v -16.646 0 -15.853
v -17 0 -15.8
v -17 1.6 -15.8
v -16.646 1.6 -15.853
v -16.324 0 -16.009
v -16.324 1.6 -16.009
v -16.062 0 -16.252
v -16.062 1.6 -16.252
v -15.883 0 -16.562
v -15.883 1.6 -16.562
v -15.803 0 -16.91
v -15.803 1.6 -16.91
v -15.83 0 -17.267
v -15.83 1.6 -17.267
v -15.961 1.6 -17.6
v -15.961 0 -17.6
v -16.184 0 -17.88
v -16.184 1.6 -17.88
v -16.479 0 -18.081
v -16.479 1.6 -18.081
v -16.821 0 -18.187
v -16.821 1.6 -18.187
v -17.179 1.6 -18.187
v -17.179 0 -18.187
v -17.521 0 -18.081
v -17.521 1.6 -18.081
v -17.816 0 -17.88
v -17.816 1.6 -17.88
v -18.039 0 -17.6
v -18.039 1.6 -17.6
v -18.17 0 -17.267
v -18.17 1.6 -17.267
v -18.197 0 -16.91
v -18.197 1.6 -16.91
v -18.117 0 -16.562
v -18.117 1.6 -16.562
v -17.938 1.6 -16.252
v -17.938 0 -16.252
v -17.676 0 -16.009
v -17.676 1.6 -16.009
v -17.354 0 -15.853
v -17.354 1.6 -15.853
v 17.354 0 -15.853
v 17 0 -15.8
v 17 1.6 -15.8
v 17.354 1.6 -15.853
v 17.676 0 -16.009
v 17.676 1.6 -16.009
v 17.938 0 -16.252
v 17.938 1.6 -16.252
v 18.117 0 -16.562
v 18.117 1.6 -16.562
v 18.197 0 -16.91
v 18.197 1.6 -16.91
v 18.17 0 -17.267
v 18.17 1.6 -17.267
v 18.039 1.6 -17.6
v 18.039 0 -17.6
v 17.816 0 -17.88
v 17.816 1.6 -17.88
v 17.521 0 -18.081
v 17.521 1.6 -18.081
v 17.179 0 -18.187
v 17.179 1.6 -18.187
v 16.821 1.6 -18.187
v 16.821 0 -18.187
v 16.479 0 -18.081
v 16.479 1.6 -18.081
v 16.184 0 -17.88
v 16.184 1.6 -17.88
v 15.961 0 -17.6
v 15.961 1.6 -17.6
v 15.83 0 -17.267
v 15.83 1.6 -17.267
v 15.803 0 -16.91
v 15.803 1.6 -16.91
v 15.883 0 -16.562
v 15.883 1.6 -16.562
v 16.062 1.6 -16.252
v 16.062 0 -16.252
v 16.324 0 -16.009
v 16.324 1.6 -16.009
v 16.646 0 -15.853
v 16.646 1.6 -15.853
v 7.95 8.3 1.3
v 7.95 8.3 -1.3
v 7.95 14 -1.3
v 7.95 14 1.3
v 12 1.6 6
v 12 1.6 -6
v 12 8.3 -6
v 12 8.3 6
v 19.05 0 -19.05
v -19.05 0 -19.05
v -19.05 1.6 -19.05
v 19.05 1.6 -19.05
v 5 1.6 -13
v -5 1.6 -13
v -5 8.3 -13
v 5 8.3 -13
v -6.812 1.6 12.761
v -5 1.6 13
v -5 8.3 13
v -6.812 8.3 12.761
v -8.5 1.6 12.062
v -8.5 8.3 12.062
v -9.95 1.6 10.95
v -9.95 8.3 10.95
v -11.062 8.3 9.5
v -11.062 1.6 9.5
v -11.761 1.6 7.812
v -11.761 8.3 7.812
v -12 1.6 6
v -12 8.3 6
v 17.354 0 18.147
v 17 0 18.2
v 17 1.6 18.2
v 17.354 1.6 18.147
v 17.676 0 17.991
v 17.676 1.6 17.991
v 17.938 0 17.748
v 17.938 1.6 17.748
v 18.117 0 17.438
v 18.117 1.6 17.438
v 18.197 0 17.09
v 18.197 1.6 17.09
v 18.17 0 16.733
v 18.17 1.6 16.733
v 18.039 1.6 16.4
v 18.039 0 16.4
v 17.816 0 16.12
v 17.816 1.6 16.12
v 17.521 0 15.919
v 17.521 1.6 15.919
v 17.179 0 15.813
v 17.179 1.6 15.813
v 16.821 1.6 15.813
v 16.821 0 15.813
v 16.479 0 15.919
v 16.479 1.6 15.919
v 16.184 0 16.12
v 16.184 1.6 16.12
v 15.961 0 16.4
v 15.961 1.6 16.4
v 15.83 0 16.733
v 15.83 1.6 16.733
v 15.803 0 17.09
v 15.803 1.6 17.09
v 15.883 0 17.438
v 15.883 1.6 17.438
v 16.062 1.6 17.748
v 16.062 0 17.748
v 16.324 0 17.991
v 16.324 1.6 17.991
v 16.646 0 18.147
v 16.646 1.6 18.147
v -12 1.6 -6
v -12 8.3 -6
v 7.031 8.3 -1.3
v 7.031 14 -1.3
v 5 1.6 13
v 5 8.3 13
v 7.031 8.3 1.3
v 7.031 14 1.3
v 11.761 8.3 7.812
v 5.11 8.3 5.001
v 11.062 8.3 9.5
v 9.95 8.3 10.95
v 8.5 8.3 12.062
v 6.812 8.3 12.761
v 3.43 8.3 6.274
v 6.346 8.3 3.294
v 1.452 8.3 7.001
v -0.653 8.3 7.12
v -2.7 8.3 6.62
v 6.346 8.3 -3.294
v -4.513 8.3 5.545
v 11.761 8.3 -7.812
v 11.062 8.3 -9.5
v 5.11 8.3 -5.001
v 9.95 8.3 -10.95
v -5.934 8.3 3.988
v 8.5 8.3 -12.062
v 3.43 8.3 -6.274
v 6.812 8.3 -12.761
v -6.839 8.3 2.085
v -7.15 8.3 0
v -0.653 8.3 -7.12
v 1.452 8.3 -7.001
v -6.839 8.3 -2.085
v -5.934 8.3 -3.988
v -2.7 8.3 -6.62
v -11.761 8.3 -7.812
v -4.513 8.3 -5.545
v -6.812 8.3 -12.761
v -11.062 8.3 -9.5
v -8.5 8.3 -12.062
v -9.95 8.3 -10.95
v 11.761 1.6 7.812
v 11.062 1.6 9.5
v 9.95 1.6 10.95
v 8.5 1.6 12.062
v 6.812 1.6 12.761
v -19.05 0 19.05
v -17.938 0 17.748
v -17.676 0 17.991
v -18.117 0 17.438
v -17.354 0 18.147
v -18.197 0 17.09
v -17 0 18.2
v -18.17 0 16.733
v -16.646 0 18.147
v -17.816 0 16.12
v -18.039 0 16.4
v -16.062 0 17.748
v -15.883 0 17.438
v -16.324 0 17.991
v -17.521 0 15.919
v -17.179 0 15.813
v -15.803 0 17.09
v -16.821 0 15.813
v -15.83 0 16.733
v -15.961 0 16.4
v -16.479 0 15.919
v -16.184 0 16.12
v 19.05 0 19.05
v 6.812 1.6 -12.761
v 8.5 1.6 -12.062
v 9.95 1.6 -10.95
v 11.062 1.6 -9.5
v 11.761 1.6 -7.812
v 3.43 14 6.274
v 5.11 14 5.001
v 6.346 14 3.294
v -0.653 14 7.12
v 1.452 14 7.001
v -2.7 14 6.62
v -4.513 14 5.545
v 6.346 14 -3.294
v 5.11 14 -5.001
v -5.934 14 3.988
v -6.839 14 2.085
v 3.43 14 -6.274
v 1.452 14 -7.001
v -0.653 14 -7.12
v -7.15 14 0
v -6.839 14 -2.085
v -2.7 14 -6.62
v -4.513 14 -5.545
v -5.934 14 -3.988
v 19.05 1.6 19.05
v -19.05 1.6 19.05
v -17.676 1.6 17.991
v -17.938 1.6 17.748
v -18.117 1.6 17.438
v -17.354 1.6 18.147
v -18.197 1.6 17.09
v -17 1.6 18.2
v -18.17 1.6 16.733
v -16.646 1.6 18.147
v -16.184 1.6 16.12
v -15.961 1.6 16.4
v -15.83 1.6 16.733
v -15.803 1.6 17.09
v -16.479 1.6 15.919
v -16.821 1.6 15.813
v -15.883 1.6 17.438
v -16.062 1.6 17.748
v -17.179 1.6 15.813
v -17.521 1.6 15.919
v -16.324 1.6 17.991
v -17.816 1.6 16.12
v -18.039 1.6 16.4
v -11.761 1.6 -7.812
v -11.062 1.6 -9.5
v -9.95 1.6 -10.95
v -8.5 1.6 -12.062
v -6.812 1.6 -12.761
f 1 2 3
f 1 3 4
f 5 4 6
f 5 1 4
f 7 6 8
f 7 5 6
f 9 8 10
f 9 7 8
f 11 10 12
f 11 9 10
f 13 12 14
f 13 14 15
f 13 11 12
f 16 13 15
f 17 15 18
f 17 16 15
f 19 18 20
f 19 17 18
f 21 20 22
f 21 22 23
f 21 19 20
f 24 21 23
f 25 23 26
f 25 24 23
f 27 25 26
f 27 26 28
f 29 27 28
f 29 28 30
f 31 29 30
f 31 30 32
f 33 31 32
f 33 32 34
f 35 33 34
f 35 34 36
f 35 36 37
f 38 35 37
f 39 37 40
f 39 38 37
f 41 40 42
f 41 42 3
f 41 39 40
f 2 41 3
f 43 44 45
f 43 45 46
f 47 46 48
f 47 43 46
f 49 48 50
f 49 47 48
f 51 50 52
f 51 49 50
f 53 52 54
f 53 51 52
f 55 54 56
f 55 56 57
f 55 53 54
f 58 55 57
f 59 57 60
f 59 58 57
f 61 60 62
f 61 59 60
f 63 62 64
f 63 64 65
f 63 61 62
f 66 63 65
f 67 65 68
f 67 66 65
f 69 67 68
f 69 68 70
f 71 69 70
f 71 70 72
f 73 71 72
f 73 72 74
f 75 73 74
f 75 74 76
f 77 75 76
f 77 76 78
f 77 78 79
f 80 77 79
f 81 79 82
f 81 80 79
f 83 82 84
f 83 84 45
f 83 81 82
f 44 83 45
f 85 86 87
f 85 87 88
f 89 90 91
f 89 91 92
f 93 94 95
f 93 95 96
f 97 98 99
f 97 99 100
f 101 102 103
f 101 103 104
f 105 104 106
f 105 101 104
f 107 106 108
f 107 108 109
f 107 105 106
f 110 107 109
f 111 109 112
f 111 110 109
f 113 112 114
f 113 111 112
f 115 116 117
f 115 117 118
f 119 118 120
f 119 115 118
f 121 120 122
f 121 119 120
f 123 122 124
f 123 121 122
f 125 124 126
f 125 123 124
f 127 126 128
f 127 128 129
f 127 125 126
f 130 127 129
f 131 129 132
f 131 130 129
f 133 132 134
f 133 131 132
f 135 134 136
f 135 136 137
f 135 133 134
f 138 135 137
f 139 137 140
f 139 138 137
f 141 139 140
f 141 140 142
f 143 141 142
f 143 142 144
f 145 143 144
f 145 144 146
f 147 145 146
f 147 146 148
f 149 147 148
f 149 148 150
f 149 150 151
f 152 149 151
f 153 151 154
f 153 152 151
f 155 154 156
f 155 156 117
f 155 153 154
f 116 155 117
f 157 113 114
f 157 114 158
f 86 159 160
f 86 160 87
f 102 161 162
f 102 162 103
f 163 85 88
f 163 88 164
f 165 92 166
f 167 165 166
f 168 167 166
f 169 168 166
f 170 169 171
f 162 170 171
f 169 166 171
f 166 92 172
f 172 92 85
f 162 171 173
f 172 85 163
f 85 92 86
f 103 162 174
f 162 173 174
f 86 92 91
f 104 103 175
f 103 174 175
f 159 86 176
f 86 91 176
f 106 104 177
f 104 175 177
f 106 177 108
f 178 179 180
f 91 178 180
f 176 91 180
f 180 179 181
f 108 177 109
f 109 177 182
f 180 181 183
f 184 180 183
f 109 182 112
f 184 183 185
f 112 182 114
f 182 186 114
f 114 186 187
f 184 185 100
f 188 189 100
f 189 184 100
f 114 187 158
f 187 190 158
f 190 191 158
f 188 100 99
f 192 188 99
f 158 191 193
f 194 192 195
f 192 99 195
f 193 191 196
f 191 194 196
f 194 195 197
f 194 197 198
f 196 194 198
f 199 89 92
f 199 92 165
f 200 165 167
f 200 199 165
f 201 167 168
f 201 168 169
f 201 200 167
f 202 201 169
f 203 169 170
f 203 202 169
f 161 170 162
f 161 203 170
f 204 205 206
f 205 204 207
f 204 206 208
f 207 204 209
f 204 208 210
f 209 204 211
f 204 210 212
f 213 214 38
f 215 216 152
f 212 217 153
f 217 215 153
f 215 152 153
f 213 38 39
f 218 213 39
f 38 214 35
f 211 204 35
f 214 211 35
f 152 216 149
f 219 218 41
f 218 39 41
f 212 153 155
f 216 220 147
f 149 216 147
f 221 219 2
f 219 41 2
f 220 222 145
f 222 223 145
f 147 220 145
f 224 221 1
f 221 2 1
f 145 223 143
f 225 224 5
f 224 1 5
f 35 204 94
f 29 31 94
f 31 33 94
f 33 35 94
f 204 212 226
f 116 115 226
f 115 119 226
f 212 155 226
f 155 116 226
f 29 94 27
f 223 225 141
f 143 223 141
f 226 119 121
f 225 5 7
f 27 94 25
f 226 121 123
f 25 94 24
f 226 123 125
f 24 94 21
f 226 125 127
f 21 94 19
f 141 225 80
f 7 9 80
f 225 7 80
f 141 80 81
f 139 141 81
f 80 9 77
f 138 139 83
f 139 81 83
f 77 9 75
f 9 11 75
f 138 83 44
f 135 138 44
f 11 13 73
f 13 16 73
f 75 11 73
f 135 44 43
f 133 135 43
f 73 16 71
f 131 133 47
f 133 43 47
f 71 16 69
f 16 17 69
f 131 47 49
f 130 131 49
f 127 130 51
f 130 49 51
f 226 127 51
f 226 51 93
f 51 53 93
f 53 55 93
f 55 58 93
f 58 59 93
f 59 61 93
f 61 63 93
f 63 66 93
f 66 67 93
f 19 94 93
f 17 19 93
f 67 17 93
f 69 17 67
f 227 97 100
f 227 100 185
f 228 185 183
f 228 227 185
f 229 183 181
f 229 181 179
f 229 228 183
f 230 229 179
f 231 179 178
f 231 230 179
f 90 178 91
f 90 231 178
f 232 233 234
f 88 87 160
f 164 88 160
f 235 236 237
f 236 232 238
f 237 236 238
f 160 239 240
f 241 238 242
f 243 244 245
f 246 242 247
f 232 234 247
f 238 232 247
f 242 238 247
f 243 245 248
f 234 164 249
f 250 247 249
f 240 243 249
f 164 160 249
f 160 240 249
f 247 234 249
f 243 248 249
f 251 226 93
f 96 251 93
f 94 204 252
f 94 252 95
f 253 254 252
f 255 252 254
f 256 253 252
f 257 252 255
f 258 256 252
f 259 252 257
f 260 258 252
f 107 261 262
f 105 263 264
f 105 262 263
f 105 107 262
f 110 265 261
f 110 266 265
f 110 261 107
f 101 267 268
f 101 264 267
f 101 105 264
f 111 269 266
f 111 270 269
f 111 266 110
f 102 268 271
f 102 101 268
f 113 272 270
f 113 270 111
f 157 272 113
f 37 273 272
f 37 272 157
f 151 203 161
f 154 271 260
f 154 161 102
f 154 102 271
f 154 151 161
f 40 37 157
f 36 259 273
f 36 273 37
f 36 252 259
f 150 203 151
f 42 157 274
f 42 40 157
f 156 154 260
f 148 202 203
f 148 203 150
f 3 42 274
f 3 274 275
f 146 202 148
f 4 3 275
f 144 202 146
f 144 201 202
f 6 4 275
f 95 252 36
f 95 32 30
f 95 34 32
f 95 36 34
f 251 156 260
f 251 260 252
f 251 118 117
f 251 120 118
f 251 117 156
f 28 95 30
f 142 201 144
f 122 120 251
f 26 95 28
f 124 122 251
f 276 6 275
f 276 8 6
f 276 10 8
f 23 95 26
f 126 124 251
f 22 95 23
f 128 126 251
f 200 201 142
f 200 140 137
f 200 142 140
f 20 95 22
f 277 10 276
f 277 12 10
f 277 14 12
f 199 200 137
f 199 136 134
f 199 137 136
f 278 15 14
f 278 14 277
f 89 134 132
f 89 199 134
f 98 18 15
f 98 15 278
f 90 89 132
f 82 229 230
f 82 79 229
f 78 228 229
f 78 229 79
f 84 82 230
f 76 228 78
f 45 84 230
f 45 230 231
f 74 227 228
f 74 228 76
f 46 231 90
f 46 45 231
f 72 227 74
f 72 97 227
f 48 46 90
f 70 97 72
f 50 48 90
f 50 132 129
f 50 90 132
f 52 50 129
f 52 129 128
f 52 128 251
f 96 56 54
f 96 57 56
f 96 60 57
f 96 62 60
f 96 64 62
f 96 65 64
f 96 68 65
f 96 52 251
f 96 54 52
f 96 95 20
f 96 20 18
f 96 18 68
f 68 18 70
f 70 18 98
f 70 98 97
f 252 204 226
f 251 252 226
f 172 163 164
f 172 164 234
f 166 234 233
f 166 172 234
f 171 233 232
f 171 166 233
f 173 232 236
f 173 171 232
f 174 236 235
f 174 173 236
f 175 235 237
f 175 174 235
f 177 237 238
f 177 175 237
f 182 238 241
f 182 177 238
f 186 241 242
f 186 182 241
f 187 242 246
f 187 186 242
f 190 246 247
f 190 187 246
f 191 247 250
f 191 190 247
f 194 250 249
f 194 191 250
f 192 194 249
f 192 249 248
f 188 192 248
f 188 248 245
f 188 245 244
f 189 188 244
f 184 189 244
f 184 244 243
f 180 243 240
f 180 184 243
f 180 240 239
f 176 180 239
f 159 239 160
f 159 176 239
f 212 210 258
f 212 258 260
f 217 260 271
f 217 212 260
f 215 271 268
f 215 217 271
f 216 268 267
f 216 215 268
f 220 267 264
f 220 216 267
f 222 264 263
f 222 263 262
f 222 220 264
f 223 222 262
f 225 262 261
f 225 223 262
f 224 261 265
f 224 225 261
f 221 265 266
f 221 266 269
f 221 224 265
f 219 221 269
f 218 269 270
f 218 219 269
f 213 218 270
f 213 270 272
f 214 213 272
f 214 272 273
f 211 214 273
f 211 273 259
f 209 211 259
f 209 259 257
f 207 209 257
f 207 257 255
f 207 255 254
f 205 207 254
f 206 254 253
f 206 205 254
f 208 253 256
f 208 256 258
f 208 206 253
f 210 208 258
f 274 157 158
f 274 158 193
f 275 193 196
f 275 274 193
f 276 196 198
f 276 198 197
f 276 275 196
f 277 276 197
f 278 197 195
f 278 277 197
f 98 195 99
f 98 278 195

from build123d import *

# Parameters (mm, degrees)
SKETCH1_W           = 38.1
SKETCH1_H           = 38.1
SKETCH1_R           = 1.2
BOSS_EXTRUDE1_DEPTH = 1.6
BOSS_EXTRUDE2_DEPTH = 6.7
BOSS_EXTRUDE3_DEPTH = 5.7


with BuildPart() as part:
    # Sketch1 → Boss-Extrude1 (new body)
    with BuildSketch(Plane(origin=(0, 0, 0), x_dir=(1, 0, 0), z_dir=(0, 1, 0))):
        Rectangle(SKETCH1_W, SKETCH1_H)
        with Locations(Location((-17, 17, 0), (0, 0, 270))):
            Circle(SKETCH1_R, mode=Mode.SUBTRACT)
        with Locations(Location((17, 17, 0), (0, 0, 270))):
            Circle(SKETCH1_R, mode=Mode.SUBTRACT)
        with Locations(Location((17, -17, 0), (0, 0, 270))):
            Circle(SKETCH1_R, mode=Mode.SUBTRACT)
        with Locations(Location((-17, -17, 0), (0, 0, 270))):
            Circle(SKETCH1_R, mode=Mode.SUBTRACT)
    extrude(amount=BOSS_EXTRUDE1_DEPTH)

    # Sketch2 → Boss-Extrude2 (add)
    with BuildSketch(Plane(origin=(0, 1.6, 0), x_dir=(1, 0, 0), z_dir=(0, 1, 0))):
        with BuildLine():
            Line((-5, 13), (5, 13))
            ThreePointArc((5, 13), (9.949747468, 10.949747468), (12, 6))
            Line((12, 6), (12, -6))
            ThreePointArc((12, -6), (9.949747468, -10.949747468), (5, -13))
            Line((5, -13), (-5, -13))
            ThreePointArc((-5, -13), (-9.949747468, -10.949747468), (-12, -6))
            Line((-12, -6), (-12, 6))
            ThreePointArc((-12, 6), (-9.949747468, 10.949747468), (-5, 13))
        make_face()
    extrude(amount=BOSS_EXTRUDE2_DEPTH)

    # Sketch3 → Boss-Extrude3 (add)
    with BuildSketch(Plane(origin=(0, 8.3, 0), x_dir=(1, 0, 0), z_dir=(0, 1, 0))):
        with BuildLine():
            Line((7.030824987, 1.3), (7.95, 1.3))
            Line((7.95, 1.3), (7.95, -1.3))
            Line((7.95, -1.3), (7.030824987, -1.3))
            ThreePointArc((7.030824987, -1.3), (-7.15, 0), (7.030824987, 1.3))
        make_face()
    extrude(amount=BOSS_EXTRUDE3_DEPTH)


solid = part.part
